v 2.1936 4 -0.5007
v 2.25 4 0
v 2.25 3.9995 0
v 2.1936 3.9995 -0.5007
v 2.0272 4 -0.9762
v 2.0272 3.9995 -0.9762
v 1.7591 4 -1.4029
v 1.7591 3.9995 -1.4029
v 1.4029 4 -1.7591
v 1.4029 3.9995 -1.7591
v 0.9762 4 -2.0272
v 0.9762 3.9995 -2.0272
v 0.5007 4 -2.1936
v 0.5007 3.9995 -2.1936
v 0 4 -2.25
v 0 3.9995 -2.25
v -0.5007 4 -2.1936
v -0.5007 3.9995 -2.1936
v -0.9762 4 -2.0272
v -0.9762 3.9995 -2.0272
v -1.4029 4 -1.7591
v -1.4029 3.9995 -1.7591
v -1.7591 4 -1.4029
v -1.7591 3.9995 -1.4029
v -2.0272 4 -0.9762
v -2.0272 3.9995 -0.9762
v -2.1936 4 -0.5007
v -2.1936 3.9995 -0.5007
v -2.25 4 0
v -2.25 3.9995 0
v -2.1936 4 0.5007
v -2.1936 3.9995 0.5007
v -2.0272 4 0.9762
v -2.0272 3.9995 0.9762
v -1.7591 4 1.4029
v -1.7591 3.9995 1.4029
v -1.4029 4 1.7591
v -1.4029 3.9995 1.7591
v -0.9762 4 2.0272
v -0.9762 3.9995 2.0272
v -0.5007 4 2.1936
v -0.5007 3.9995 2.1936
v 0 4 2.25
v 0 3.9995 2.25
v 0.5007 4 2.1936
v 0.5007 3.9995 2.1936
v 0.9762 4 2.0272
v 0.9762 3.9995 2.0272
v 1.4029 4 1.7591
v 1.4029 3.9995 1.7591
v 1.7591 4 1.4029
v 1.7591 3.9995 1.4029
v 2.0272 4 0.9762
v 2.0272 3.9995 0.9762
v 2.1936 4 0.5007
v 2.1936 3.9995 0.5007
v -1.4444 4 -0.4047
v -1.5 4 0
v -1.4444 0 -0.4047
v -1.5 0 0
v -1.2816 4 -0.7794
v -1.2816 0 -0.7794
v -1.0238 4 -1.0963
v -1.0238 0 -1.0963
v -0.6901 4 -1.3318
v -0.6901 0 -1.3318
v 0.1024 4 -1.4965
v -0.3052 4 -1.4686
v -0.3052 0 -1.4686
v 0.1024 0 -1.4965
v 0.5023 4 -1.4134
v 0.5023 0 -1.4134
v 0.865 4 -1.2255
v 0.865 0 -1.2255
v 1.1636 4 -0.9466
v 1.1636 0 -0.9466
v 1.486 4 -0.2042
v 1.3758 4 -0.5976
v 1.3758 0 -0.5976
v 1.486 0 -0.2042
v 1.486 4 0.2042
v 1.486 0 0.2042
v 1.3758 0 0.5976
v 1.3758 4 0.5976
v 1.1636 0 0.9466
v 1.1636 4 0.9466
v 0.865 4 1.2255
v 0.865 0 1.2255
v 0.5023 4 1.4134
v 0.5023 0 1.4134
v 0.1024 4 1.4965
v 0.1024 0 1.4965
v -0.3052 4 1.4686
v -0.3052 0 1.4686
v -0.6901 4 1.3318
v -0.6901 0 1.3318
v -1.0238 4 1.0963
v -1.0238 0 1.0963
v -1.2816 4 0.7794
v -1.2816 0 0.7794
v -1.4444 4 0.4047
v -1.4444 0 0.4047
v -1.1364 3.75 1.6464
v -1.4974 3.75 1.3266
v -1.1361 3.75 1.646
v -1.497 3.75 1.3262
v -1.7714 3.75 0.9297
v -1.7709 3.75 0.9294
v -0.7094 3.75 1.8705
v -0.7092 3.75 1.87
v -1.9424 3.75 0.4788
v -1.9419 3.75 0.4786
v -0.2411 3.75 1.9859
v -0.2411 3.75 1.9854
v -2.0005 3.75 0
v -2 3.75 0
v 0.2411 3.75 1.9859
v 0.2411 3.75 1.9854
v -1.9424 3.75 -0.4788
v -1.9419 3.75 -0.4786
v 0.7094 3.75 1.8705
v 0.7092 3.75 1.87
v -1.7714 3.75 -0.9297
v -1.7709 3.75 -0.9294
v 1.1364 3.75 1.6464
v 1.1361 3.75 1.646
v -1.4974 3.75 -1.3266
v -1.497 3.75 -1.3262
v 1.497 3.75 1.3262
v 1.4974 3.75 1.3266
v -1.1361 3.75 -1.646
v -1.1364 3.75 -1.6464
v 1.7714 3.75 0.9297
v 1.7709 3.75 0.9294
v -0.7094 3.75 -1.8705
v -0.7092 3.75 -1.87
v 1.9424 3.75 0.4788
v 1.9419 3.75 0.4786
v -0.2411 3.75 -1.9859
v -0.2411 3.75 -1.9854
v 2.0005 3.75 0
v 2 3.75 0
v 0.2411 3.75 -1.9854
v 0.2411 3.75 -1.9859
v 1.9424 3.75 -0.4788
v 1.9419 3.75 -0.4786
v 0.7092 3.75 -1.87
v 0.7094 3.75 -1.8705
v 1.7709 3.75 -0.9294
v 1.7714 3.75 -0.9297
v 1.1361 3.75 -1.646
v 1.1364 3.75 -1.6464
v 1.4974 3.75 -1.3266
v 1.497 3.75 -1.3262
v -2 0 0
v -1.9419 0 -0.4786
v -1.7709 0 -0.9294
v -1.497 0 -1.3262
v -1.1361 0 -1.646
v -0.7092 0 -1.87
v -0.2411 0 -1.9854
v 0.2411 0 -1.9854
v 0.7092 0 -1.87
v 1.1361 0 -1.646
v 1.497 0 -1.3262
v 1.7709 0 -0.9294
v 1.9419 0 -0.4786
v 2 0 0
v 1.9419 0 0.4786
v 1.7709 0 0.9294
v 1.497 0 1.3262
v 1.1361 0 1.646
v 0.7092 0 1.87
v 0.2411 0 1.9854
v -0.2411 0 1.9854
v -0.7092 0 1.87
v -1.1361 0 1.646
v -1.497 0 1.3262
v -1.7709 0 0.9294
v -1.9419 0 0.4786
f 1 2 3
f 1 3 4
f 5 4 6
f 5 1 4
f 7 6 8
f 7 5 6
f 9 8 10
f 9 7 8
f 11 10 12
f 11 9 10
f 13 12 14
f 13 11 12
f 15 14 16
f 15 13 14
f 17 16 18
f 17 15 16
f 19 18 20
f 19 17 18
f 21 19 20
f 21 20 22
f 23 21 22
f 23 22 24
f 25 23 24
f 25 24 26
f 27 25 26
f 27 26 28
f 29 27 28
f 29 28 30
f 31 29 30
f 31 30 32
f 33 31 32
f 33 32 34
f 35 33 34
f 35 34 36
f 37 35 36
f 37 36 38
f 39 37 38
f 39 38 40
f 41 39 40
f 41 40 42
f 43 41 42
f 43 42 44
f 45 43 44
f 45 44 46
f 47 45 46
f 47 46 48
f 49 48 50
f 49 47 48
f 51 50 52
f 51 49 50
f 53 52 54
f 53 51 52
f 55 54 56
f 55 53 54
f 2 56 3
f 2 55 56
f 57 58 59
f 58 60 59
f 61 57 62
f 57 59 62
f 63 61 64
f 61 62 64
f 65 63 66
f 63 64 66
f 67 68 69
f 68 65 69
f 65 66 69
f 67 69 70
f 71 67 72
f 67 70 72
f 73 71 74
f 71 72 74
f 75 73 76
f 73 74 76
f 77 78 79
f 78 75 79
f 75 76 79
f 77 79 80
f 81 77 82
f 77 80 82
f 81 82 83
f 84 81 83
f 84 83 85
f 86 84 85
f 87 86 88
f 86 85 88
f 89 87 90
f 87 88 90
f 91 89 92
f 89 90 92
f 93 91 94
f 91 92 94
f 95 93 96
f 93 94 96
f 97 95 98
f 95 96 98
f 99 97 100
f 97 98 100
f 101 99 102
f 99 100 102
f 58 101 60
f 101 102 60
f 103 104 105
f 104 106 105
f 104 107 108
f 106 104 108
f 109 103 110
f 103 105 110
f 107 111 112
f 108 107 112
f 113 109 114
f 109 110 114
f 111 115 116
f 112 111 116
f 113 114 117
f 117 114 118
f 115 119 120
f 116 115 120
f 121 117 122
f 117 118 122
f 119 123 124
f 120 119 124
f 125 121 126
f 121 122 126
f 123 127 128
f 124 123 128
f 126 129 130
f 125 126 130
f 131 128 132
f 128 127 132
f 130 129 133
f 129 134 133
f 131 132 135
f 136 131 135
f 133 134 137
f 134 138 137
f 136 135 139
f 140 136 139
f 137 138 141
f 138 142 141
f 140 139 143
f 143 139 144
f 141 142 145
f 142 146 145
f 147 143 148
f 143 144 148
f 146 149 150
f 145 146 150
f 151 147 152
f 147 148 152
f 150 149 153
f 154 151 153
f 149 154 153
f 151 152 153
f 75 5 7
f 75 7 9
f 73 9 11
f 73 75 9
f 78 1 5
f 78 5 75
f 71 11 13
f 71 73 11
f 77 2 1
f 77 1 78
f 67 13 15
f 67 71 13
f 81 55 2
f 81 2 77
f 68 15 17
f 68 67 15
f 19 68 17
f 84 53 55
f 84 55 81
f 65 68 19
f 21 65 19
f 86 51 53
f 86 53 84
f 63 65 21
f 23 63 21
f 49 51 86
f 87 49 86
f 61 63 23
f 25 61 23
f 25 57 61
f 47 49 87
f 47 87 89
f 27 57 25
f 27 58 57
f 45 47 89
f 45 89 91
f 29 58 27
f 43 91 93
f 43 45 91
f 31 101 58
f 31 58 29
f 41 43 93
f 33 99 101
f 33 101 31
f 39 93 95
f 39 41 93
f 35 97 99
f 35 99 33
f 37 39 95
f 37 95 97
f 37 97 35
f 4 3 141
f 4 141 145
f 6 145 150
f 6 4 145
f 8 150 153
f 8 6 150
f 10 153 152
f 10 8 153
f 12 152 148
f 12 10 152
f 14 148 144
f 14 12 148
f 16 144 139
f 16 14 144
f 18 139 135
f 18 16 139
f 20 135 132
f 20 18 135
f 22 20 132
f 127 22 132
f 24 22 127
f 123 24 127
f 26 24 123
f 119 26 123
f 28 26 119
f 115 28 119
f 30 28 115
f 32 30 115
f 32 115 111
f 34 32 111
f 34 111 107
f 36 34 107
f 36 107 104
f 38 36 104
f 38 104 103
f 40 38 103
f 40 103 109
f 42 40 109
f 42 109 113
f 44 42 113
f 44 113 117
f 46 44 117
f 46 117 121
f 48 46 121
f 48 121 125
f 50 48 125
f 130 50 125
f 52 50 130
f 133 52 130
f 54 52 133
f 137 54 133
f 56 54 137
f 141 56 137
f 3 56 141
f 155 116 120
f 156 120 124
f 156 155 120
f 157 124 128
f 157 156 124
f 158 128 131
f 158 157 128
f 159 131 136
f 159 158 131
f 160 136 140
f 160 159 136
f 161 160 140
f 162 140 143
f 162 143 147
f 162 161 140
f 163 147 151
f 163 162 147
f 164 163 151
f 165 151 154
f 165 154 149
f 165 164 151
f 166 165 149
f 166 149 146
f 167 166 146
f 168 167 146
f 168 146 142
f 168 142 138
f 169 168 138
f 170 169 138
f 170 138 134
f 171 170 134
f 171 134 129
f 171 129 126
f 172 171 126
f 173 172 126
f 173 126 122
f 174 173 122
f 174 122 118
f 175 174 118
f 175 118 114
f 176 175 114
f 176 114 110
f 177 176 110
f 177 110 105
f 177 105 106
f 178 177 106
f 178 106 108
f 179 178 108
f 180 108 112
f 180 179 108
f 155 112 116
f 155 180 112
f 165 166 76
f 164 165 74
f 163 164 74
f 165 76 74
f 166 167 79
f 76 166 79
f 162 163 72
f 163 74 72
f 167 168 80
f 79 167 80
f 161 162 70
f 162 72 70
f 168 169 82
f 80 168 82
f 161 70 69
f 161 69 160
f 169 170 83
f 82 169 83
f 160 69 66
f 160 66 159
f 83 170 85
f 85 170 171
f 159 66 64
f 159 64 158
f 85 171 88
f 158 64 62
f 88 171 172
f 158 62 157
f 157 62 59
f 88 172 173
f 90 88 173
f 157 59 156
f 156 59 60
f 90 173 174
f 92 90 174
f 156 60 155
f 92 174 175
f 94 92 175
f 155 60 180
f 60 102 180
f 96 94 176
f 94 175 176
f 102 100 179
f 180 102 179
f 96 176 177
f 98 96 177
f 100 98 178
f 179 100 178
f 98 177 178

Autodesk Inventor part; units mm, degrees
ref_plane "YZ Plane" through (0, 0, 0) normal (1, 0, 0) x (0, 1, 0)
ref_plane "XZ Plane" through (0, 0, 0) normal (0, 1, 0) x (-1, 0, 0)
ref_plane "XY Plane" through (0, 0, 0) normal (0, 0, 1) x (1, 0, 0)
sketch "Sketch1" plane through (0, 0, 0) normal (0, 1, 0) x (-1, 0, 0)
  circle A0 centre (0, 0) radius 2
  circle A1 centre (0, 0) radius 1.5
  dimension "d0" = 4
  dimension "d1" = 3
extrude "Extrusion1" add sketch "Sketch1" along normal blind 4
sketch "Sketch2" plane through (0, 4, 0) normal (0, 1, 0) x (1, 0, 0)
  circle A0 centre (0, 0) radius 2.25
  circle A1 centre (0, 0) radius 2
  dimension "d4" = 4.5
extrude "Extrusion2" add sketch "Sketch2" against normal blind 0.25
chamfer "Chamfer1" distance 0.25 angle 45 1 edges at (-2.25, 3.75, 0)
thread "Thread1" size "M3x0.5" class "6H" standard "ANSI Metric M Profile" full length
properties part number "Threaded_Insert_M3x4" material "Brass, Soft Yellow"
